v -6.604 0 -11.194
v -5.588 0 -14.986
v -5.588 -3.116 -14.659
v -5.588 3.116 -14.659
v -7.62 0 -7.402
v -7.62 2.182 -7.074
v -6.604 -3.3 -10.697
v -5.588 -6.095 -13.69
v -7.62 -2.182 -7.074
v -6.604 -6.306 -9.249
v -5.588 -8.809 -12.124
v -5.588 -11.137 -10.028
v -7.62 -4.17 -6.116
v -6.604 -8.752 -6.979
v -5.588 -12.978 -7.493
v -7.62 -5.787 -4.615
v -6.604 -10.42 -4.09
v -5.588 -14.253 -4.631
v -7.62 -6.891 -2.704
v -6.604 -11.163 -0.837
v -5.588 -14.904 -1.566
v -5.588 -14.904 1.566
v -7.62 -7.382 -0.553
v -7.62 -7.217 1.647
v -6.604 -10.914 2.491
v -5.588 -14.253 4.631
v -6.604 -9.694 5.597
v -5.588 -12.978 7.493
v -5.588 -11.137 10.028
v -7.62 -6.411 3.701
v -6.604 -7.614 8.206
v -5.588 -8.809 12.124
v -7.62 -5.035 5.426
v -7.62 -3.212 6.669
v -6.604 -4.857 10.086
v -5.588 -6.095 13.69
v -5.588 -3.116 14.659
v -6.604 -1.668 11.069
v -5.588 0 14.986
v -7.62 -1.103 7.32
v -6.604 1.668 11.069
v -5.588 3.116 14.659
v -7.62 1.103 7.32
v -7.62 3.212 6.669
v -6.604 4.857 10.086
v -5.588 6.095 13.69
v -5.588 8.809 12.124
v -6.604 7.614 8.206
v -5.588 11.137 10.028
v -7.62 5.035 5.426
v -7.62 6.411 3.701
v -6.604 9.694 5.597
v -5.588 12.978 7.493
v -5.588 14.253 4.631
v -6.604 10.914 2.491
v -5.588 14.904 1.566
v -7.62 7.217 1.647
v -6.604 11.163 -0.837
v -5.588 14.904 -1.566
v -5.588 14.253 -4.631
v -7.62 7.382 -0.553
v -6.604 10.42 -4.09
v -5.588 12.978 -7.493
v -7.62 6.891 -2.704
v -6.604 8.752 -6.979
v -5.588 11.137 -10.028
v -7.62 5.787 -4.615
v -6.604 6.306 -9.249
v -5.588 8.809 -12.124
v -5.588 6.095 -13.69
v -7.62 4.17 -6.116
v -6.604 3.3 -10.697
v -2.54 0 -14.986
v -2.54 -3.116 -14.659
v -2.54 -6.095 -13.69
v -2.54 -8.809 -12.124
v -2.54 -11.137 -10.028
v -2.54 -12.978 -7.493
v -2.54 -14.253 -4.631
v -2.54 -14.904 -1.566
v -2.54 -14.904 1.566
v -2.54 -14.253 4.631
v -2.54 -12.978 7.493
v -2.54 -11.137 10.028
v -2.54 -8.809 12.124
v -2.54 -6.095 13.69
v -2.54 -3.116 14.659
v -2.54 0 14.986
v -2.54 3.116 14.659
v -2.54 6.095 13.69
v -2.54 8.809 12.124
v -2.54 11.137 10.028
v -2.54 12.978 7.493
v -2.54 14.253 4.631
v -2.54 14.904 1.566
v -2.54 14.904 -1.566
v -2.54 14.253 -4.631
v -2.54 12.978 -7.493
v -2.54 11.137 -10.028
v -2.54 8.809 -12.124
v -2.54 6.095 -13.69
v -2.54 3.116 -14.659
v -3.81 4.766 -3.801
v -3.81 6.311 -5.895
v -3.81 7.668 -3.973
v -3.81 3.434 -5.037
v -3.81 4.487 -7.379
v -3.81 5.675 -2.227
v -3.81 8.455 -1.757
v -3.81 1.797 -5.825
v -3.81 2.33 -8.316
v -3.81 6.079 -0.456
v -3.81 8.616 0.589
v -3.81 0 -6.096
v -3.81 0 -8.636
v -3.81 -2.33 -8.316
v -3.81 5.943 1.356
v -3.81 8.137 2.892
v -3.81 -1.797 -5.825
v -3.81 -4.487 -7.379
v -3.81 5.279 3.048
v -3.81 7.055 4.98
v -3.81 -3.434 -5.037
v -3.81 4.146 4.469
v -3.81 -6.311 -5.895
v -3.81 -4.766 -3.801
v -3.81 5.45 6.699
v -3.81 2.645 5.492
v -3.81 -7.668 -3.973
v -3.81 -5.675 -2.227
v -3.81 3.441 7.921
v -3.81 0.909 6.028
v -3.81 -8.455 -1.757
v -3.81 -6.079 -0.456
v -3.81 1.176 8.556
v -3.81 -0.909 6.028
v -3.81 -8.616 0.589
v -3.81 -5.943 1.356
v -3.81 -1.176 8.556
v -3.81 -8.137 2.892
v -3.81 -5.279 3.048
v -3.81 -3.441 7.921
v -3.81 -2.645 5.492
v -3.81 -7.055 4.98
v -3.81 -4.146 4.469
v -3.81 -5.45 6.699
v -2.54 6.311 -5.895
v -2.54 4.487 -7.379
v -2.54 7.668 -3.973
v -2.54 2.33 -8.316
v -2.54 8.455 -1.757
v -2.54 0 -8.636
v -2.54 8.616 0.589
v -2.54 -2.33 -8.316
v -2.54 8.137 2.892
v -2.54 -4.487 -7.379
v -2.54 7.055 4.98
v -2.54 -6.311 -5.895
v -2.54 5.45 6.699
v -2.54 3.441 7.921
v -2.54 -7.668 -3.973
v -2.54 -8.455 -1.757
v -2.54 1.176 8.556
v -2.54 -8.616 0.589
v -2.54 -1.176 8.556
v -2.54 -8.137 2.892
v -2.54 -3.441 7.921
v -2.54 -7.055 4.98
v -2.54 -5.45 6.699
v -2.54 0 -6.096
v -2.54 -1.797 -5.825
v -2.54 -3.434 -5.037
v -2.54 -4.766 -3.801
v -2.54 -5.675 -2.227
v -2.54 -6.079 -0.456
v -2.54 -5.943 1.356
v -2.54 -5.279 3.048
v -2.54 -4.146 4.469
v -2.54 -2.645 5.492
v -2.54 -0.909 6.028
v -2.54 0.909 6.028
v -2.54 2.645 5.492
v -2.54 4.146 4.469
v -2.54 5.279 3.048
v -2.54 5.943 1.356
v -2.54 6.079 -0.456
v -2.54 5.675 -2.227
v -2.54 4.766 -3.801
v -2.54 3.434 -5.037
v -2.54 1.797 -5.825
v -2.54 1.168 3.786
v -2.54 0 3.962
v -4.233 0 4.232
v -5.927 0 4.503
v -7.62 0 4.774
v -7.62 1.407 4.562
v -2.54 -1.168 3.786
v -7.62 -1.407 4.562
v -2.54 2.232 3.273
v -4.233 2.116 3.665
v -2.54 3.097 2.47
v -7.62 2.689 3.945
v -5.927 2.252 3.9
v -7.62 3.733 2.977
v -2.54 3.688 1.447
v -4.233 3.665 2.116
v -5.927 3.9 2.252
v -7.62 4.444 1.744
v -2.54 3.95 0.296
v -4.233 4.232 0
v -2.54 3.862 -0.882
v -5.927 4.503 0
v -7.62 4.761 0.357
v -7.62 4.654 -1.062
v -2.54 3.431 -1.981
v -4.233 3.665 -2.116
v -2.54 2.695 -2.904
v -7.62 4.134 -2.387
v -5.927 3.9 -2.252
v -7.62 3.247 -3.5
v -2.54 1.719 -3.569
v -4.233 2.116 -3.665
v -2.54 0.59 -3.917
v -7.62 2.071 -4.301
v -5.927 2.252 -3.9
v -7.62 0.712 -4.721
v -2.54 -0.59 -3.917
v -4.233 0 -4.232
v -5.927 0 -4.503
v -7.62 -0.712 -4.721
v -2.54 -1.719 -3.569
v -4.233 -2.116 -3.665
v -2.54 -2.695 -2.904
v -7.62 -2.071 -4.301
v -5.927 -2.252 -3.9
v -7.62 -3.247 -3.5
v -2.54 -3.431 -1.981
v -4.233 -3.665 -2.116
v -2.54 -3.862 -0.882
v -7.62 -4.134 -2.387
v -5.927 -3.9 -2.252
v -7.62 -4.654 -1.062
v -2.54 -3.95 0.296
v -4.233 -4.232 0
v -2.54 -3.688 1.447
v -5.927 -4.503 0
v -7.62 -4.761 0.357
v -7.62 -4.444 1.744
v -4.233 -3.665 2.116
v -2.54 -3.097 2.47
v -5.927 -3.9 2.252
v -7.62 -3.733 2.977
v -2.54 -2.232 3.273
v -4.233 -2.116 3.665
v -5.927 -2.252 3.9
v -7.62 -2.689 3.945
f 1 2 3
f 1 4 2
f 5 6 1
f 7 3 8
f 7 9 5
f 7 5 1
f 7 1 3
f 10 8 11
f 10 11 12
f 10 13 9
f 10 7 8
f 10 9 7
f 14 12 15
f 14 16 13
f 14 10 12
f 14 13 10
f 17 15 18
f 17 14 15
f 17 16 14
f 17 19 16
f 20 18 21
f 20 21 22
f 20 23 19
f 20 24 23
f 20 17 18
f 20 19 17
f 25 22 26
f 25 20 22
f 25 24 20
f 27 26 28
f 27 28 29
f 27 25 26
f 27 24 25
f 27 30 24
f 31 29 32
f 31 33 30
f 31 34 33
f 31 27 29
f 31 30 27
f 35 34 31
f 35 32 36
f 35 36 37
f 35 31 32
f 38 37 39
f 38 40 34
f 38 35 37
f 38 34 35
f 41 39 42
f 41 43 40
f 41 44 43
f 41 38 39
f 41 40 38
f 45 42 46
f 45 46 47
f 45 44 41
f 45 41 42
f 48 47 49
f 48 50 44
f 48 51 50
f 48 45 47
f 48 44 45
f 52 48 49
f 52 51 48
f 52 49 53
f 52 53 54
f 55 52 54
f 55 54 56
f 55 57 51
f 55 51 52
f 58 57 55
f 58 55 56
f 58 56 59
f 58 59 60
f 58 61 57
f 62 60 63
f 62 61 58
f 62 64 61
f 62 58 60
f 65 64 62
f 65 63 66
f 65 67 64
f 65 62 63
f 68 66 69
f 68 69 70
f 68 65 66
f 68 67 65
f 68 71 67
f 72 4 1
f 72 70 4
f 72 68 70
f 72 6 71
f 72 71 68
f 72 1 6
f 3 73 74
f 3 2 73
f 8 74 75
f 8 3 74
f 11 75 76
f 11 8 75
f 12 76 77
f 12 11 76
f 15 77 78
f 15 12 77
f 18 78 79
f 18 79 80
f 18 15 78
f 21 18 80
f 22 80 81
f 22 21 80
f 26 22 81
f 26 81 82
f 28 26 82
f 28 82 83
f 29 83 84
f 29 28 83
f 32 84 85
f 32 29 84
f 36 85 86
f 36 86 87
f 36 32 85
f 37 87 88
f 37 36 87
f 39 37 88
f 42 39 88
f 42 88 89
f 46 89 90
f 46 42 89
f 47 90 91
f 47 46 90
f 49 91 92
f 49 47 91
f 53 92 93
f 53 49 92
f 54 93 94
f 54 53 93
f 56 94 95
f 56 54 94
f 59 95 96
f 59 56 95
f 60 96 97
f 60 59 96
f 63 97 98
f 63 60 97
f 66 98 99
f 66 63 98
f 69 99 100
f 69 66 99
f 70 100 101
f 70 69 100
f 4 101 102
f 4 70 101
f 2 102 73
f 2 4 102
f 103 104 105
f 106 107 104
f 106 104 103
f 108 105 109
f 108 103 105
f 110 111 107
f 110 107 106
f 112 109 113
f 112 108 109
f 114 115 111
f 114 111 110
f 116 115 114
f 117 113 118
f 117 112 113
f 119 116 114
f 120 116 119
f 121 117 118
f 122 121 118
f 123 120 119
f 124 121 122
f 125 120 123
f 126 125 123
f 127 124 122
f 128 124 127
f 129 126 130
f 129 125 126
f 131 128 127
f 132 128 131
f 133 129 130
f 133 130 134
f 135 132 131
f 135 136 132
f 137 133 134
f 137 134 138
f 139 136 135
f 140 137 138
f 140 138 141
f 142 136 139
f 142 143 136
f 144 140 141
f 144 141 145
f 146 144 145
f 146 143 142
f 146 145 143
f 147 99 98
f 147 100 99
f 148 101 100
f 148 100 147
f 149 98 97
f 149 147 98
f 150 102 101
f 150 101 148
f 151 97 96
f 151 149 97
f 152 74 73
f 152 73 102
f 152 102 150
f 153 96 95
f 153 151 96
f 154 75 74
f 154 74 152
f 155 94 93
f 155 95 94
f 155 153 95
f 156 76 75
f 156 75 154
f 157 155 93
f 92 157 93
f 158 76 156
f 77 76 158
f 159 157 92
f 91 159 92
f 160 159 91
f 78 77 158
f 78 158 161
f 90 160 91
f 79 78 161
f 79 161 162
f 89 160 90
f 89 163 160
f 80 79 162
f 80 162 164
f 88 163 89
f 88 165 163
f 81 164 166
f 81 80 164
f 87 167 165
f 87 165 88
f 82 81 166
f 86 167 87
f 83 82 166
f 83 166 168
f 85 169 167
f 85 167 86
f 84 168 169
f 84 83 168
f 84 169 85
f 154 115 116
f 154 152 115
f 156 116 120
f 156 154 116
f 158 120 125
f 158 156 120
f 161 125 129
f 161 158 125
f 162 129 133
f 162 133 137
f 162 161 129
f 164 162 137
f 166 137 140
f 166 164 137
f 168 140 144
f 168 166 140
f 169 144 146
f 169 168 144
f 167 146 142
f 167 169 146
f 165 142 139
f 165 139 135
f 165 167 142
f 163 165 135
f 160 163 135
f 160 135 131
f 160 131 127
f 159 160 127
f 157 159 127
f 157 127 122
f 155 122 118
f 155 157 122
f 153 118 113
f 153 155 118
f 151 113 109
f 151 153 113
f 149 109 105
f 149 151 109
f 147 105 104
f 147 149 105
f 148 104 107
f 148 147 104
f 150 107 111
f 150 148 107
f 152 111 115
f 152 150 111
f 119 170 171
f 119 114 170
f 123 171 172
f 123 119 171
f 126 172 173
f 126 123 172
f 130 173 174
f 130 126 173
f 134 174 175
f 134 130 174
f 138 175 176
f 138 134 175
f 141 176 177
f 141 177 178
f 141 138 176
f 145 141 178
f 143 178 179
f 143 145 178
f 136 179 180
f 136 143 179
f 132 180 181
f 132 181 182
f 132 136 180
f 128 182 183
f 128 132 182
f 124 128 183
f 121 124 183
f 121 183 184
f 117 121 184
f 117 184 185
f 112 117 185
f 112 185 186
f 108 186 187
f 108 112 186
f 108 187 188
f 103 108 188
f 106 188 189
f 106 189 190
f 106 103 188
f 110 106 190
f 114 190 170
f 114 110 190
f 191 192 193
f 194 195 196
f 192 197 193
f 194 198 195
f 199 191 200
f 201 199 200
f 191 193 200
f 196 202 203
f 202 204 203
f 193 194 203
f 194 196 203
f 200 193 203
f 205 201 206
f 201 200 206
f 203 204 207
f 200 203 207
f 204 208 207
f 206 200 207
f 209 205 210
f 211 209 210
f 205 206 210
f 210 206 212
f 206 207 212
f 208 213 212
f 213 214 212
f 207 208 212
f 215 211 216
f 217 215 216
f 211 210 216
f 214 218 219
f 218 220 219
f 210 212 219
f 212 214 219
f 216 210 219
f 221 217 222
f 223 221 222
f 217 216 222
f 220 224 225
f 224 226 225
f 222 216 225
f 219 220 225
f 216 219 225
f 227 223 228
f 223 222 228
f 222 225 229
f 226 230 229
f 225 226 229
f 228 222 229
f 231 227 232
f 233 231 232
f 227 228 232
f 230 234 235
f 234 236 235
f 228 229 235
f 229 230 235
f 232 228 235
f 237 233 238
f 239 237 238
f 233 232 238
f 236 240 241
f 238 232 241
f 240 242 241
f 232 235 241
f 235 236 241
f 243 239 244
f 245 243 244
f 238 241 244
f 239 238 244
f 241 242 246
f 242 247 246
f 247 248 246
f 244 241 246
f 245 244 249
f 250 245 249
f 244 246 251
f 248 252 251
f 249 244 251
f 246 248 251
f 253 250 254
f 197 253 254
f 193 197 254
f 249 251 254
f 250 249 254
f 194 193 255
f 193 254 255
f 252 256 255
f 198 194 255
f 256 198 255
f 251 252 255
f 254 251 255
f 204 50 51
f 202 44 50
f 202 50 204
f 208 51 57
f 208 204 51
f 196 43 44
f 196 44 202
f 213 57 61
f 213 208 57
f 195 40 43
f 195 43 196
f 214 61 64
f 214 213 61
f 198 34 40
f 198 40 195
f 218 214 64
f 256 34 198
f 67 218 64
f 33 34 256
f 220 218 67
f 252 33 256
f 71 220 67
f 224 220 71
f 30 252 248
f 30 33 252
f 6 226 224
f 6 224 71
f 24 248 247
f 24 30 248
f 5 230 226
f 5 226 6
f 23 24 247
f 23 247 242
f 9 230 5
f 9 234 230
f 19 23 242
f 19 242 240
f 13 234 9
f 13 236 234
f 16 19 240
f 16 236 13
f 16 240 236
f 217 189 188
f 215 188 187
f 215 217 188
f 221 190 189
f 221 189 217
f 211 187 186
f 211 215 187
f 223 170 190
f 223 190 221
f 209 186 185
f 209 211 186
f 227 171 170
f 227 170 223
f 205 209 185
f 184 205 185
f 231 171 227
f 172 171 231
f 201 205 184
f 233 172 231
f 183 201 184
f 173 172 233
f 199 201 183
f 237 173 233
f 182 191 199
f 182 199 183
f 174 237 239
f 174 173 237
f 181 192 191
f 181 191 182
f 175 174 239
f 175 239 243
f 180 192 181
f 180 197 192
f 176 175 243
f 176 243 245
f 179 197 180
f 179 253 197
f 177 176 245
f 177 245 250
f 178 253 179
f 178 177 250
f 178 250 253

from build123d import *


with BuildPart() as part:
    # Sketch1 → Revolve1 (revolve)
    with BuildSketch(Plane.XY, mode=Mode.PRIVATE) as revolve1_sk:
        Polygon((-2.54, 8.636), (-2.54, 14.986), (-5.588, 14.986), (-7.62, 7.402472759), (-7.62, 0), (-2.54, 0), (-2.54, 6.096), (-3.81, 6.096), (-3.81, 8.636), align=None)
    revolve(revolve1_sk.sketch.rotate(Axis((-12.512764007, 0, 0), (-1, 0, 0)), 90), axis=Axis((-12.512764007, 0, 0), (-1, 0, 0)))

    # Sketch2 → Cut-Revolve1 (revolve, cut)
    with BuildSketch(Plane.XY, mode=Mode.PRIVATE) as cut_revolve1_sk:
        Polygon((-9.728542139, 0), (0.013390026, 0), (0.013390026, 3.553074477), (-9.728542139, 5.111363938), align=None)
    revolve(cut_revolve1_sk.sketch.rotate(Axis((-9.728542139, 0, 0), (-1, 0, 0)), 270), axis=Axis((-9.728542139, 0, 0), (-1, 0, 0)), mode=Mode.SUBTRACT)


solid = part.part
